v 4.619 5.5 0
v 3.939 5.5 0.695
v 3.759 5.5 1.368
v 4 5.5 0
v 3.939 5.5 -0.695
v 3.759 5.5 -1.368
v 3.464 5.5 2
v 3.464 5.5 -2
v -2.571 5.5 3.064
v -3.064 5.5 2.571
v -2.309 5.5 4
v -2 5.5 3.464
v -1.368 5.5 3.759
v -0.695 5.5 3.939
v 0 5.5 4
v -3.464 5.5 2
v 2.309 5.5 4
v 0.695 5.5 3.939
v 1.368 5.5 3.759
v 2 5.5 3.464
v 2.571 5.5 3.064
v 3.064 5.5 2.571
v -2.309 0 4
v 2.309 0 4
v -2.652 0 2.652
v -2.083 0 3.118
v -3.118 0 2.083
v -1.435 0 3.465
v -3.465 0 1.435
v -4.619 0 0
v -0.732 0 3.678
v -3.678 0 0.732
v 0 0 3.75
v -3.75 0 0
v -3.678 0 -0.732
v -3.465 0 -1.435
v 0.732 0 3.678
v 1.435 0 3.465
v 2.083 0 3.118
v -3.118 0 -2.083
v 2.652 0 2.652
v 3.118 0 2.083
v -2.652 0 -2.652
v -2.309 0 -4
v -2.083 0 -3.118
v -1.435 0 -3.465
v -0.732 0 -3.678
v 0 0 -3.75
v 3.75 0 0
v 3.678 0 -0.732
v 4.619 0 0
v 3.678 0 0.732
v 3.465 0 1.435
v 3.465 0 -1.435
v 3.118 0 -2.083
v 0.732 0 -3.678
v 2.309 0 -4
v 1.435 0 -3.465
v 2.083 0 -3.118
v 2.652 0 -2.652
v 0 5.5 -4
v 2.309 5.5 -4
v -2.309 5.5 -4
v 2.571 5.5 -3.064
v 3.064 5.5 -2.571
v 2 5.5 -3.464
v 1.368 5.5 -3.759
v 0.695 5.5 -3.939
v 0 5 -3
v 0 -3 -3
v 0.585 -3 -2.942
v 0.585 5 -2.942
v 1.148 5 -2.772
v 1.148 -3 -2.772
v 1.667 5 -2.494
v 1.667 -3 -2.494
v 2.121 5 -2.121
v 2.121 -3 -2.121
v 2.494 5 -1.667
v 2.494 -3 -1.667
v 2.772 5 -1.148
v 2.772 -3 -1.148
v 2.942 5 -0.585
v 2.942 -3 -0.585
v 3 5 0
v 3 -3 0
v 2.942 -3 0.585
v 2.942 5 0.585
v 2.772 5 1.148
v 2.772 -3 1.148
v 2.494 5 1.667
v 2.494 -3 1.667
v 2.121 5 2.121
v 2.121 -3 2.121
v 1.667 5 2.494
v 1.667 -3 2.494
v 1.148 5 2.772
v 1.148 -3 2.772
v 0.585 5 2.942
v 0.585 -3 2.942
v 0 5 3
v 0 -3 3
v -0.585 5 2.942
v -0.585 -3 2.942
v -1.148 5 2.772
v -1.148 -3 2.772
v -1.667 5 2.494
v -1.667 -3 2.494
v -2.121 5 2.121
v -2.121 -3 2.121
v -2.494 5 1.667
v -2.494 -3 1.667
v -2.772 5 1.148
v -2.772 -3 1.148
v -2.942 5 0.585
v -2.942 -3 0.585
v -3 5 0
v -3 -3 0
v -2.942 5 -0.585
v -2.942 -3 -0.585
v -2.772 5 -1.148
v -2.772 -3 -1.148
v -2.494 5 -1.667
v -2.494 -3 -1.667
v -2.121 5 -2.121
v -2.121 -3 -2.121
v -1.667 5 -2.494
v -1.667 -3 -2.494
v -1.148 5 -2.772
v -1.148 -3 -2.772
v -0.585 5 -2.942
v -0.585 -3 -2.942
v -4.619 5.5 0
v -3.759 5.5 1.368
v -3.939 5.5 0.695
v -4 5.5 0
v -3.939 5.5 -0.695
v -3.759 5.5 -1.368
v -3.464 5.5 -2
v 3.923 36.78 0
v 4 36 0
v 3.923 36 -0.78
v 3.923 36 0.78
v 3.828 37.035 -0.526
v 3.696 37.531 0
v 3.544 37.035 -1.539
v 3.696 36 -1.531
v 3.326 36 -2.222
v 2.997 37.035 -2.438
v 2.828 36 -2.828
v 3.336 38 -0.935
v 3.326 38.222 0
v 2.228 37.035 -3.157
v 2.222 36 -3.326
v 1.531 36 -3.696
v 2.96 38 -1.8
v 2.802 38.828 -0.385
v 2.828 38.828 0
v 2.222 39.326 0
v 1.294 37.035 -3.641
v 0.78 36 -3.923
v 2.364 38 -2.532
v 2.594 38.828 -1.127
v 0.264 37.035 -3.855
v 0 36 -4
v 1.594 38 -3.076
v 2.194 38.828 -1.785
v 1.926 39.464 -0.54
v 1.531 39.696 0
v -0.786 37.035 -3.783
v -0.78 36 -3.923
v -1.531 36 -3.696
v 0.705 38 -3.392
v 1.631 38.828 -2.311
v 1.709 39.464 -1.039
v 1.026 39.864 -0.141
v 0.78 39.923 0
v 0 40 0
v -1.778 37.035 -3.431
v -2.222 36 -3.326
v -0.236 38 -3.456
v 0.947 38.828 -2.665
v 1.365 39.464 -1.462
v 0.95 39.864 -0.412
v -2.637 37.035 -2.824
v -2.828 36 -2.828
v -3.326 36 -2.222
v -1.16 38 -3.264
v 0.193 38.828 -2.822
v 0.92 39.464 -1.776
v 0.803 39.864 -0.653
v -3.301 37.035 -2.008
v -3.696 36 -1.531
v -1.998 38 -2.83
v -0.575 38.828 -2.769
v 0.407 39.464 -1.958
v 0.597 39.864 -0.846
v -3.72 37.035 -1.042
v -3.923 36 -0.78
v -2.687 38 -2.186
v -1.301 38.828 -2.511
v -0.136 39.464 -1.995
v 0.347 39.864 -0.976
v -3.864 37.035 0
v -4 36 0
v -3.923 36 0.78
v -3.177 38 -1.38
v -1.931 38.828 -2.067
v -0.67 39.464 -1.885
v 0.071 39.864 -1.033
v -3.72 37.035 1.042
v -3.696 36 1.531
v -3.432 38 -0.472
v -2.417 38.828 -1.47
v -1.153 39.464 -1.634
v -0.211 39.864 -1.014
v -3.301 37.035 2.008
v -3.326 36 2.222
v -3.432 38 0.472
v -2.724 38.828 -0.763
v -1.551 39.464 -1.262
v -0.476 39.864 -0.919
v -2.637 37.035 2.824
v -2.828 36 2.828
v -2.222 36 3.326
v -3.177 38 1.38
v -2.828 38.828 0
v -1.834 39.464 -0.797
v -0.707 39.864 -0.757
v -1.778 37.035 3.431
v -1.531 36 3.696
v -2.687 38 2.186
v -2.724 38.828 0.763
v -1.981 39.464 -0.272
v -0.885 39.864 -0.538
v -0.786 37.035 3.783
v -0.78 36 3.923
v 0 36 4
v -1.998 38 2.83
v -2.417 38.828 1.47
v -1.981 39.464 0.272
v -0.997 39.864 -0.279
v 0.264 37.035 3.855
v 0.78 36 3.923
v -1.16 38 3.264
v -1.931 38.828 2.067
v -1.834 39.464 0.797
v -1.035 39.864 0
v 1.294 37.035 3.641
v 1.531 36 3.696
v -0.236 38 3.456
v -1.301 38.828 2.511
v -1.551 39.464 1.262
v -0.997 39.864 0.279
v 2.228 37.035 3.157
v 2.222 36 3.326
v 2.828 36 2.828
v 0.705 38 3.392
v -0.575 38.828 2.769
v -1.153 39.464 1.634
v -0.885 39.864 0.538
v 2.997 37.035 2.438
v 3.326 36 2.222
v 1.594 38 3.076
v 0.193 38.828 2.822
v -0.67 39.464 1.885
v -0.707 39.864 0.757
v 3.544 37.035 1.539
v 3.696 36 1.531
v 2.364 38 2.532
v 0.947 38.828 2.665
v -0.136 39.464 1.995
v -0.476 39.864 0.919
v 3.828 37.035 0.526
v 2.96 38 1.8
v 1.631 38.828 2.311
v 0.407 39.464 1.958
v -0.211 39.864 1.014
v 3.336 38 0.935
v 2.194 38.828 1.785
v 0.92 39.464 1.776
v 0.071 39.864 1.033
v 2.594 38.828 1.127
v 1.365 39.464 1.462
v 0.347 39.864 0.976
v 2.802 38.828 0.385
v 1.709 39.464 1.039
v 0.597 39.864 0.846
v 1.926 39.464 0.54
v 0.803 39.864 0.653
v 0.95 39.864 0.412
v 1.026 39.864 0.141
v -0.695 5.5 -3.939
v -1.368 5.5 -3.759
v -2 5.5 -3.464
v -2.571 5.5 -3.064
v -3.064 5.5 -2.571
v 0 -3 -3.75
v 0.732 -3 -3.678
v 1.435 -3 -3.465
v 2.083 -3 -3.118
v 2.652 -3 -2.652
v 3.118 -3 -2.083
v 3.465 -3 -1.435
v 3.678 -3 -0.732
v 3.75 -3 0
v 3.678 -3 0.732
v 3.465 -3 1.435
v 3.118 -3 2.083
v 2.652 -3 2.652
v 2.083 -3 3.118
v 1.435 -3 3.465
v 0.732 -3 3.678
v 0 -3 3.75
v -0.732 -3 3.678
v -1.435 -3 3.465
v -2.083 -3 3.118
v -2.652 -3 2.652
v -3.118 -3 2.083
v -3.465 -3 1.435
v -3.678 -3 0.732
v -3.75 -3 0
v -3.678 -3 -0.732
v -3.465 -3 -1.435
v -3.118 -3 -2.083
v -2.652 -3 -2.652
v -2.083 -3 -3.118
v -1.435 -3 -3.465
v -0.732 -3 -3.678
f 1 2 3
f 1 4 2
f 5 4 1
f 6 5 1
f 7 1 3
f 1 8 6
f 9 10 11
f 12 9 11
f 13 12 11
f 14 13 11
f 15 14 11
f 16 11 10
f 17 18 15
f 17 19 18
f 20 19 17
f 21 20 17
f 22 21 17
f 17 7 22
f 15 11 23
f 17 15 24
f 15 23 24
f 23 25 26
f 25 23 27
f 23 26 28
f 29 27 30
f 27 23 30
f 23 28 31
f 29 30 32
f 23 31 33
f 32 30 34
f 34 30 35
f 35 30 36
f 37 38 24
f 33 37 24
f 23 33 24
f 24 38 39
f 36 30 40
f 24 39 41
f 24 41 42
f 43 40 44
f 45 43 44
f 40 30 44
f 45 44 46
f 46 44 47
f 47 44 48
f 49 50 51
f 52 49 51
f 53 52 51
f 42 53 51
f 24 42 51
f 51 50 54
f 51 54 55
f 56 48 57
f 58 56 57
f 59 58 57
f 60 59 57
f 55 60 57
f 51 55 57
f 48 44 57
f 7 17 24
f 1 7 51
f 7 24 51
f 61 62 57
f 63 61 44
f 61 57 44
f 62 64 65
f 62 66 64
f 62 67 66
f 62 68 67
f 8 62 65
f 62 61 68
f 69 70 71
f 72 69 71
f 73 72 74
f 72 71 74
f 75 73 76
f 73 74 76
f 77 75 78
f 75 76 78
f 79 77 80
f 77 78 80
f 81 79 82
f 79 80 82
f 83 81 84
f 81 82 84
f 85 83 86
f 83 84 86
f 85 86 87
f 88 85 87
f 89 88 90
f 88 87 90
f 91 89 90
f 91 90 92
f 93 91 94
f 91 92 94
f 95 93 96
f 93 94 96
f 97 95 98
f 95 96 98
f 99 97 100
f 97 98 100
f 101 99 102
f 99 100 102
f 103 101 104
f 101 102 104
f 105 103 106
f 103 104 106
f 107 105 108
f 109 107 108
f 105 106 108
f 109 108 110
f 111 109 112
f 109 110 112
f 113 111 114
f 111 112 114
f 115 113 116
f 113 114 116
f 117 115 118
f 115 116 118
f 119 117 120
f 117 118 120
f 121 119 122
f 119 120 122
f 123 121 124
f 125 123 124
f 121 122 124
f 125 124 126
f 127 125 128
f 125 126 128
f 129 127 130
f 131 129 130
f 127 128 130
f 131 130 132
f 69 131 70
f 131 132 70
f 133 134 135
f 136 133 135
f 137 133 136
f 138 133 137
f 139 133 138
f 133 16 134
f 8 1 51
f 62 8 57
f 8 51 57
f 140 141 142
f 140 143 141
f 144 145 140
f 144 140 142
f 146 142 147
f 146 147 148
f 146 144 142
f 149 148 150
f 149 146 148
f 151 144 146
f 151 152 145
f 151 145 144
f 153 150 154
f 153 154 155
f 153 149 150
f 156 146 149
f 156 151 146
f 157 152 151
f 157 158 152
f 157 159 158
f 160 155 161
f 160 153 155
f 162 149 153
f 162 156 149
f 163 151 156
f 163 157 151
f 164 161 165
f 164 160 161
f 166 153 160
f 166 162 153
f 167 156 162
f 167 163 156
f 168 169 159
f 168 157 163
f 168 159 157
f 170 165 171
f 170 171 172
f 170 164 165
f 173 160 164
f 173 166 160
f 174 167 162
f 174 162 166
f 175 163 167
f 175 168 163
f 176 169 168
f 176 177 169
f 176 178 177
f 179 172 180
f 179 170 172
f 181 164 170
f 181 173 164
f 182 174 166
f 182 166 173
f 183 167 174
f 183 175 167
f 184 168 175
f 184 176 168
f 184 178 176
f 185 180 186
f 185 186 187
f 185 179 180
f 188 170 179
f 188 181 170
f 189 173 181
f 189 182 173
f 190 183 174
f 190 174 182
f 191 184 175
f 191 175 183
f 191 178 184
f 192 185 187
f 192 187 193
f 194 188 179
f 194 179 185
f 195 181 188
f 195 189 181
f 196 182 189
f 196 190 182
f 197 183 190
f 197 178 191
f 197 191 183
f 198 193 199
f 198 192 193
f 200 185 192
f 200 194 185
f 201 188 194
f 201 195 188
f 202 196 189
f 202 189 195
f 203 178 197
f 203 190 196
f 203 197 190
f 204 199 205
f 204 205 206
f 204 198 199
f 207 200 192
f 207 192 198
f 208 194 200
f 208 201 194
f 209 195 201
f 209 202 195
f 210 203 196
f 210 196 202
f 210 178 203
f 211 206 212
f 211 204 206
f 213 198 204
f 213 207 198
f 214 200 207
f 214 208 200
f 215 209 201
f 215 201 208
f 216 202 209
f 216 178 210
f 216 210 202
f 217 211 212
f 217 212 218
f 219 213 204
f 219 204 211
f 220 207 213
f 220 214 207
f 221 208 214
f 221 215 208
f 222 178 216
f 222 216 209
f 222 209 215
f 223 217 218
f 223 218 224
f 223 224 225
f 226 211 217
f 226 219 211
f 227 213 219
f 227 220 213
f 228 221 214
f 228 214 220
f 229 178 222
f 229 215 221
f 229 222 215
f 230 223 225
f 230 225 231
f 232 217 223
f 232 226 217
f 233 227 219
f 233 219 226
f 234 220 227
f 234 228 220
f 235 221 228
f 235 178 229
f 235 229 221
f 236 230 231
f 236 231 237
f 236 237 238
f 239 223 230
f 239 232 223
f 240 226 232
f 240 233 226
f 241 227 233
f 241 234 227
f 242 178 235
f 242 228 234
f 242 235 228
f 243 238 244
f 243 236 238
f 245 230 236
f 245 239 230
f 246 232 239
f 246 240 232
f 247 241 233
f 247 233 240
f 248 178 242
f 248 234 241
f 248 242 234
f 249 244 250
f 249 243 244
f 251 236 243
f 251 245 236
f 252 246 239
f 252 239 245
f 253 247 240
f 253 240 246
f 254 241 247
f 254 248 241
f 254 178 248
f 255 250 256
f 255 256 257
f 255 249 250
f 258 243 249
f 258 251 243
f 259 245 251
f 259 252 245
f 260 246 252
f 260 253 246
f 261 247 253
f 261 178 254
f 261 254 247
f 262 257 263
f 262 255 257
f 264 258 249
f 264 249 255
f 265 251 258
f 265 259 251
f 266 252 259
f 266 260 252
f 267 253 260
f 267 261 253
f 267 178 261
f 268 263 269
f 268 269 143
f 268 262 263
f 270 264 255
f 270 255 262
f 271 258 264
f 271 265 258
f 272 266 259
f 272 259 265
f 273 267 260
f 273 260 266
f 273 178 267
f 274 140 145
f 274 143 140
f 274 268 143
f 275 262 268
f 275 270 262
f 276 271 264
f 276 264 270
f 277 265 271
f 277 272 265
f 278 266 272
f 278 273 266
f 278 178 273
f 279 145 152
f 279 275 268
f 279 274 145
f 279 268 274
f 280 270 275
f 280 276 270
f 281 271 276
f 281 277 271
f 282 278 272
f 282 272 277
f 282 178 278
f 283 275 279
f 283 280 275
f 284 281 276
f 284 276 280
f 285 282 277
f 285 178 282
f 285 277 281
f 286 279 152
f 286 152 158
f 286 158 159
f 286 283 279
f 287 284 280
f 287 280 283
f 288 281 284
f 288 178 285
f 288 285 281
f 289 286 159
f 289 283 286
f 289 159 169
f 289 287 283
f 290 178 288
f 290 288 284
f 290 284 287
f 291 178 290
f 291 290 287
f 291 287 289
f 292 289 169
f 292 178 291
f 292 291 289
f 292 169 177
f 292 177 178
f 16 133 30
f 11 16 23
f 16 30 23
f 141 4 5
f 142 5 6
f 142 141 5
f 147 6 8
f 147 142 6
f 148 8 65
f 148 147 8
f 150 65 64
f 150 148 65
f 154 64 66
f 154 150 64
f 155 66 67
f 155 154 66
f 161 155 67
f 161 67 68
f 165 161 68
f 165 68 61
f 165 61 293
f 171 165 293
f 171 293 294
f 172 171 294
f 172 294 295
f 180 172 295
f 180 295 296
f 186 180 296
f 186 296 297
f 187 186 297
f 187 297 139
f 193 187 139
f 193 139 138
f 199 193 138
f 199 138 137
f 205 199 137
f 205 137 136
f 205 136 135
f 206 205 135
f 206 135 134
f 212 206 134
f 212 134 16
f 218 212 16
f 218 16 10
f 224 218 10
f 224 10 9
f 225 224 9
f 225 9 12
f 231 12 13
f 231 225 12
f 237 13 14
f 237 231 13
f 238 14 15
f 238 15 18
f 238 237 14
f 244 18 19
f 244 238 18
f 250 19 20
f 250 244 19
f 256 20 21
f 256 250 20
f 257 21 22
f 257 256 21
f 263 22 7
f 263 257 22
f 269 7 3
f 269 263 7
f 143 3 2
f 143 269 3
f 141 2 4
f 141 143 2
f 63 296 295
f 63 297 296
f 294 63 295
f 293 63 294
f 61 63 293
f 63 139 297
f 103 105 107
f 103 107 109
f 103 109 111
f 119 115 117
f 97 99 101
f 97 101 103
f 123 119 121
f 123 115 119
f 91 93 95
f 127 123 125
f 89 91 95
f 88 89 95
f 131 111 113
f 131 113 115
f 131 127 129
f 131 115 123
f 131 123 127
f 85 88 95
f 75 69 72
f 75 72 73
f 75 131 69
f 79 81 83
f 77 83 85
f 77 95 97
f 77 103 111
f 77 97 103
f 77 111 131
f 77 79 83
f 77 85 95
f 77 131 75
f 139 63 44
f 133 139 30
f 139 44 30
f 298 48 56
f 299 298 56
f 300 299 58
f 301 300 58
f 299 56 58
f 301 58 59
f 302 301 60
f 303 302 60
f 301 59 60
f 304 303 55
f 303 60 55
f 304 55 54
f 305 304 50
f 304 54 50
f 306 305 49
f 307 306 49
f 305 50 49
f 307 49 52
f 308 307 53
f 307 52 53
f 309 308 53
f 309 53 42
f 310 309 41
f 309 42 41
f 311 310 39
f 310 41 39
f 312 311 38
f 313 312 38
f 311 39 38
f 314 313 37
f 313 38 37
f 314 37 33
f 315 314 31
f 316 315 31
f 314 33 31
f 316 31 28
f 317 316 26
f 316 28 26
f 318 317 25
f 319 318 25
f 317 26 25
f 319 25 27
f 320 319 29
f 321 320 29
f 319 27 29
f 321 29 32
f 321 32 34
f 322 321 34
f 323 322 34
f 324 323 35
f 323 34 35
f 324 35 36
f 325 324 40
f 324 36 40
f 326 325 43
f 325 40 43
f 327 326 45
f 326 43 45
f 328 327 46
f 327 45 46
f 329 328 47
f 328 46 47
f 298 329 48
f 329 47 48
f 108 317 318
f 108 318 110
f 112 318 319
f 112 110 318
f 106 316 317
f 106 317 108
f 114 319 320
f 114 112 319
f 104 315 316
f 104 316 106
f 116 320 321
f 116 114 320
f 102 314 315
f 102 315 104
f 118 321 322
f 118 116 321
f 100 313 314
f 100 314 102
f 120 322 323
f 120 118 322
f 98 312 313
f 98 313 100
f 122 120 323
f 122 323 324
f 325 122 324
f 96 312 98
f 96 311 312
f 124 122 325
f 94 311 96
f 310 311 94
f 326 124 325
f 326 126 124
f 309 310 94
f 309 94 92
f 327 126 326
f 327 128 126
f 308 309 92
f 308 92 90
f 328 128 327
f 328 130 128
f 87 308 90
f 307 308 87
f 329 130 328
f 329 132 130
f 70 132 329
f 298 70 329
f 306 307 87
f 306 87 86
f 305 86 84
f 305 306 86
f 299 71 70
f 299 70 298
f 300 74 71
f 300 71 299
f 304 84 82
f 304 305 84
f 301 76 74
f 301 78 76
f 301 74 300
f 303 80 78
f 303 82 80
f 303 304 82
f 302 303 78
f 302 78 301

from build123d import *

# Parameters (mm, degrees)
BOSS_EXTRUDE1_DEPTH = 5.5
SKETCH3_R           = 3.75
BOSS_EXTRUDE2_DEPTH = 3
SKETCH4_R           = 3
CUT_EXTRUDE1_DEPTH  = 8


with BuildPart() as part:
    # Sketch1 → Revolve1 (revolve)
    with BuildSketch(Plane.XY):
        with BuildLine():
            Line((0, 0), (4, 0))
            Line((4, 0), (4, 36))
            ThreePointArc((4, 36), (2.828427125, 38.828427125), (0, 40))
            Line((0, 40), (0, 0))
        make_face()
    revolve(axis=Axis((0, 0, 0), (0, 1, 0)))

    # Sketch2 → Boss-Extrude1 (add)
    with BuildSketch(Plane(origin=(0, 0, 0), x_dir=(1, 0, 0), z_dir=(0, 1, 0))):
        Polygon((4.618802154, 0), (2.309401077, 4), (-2.309401077, 4), (-4.618802154, 0), (-2.309401077, -4), (2.309401077, -4), align=None)
    extrude(amount=BOSS_EXTRUDE1_DEPTH)

    # Sketch3 → Boss-Extrude2 (add)
    with BuildSketch(Plane.XZ):
        with Locations(Location((0, 0, 0), (0, 0, 270))):
            Circle(SKETCH3_R)
    extrude(amount=BOSS_EXTRUDE2_DEPTH)

    # Sketch4 → Cut-Extrude1 (cut)
    with BuildSketch(Plane.XZ.offset(3)):
        with Locations(Location((0, 0, 0), (0, 0, 270))):
            Circle(SKETCH4_R)
    extrude(amount=-CUT_EXTRUDE1_DEPTH, mode=Mode.SUBTRACT)


solid = part.part
